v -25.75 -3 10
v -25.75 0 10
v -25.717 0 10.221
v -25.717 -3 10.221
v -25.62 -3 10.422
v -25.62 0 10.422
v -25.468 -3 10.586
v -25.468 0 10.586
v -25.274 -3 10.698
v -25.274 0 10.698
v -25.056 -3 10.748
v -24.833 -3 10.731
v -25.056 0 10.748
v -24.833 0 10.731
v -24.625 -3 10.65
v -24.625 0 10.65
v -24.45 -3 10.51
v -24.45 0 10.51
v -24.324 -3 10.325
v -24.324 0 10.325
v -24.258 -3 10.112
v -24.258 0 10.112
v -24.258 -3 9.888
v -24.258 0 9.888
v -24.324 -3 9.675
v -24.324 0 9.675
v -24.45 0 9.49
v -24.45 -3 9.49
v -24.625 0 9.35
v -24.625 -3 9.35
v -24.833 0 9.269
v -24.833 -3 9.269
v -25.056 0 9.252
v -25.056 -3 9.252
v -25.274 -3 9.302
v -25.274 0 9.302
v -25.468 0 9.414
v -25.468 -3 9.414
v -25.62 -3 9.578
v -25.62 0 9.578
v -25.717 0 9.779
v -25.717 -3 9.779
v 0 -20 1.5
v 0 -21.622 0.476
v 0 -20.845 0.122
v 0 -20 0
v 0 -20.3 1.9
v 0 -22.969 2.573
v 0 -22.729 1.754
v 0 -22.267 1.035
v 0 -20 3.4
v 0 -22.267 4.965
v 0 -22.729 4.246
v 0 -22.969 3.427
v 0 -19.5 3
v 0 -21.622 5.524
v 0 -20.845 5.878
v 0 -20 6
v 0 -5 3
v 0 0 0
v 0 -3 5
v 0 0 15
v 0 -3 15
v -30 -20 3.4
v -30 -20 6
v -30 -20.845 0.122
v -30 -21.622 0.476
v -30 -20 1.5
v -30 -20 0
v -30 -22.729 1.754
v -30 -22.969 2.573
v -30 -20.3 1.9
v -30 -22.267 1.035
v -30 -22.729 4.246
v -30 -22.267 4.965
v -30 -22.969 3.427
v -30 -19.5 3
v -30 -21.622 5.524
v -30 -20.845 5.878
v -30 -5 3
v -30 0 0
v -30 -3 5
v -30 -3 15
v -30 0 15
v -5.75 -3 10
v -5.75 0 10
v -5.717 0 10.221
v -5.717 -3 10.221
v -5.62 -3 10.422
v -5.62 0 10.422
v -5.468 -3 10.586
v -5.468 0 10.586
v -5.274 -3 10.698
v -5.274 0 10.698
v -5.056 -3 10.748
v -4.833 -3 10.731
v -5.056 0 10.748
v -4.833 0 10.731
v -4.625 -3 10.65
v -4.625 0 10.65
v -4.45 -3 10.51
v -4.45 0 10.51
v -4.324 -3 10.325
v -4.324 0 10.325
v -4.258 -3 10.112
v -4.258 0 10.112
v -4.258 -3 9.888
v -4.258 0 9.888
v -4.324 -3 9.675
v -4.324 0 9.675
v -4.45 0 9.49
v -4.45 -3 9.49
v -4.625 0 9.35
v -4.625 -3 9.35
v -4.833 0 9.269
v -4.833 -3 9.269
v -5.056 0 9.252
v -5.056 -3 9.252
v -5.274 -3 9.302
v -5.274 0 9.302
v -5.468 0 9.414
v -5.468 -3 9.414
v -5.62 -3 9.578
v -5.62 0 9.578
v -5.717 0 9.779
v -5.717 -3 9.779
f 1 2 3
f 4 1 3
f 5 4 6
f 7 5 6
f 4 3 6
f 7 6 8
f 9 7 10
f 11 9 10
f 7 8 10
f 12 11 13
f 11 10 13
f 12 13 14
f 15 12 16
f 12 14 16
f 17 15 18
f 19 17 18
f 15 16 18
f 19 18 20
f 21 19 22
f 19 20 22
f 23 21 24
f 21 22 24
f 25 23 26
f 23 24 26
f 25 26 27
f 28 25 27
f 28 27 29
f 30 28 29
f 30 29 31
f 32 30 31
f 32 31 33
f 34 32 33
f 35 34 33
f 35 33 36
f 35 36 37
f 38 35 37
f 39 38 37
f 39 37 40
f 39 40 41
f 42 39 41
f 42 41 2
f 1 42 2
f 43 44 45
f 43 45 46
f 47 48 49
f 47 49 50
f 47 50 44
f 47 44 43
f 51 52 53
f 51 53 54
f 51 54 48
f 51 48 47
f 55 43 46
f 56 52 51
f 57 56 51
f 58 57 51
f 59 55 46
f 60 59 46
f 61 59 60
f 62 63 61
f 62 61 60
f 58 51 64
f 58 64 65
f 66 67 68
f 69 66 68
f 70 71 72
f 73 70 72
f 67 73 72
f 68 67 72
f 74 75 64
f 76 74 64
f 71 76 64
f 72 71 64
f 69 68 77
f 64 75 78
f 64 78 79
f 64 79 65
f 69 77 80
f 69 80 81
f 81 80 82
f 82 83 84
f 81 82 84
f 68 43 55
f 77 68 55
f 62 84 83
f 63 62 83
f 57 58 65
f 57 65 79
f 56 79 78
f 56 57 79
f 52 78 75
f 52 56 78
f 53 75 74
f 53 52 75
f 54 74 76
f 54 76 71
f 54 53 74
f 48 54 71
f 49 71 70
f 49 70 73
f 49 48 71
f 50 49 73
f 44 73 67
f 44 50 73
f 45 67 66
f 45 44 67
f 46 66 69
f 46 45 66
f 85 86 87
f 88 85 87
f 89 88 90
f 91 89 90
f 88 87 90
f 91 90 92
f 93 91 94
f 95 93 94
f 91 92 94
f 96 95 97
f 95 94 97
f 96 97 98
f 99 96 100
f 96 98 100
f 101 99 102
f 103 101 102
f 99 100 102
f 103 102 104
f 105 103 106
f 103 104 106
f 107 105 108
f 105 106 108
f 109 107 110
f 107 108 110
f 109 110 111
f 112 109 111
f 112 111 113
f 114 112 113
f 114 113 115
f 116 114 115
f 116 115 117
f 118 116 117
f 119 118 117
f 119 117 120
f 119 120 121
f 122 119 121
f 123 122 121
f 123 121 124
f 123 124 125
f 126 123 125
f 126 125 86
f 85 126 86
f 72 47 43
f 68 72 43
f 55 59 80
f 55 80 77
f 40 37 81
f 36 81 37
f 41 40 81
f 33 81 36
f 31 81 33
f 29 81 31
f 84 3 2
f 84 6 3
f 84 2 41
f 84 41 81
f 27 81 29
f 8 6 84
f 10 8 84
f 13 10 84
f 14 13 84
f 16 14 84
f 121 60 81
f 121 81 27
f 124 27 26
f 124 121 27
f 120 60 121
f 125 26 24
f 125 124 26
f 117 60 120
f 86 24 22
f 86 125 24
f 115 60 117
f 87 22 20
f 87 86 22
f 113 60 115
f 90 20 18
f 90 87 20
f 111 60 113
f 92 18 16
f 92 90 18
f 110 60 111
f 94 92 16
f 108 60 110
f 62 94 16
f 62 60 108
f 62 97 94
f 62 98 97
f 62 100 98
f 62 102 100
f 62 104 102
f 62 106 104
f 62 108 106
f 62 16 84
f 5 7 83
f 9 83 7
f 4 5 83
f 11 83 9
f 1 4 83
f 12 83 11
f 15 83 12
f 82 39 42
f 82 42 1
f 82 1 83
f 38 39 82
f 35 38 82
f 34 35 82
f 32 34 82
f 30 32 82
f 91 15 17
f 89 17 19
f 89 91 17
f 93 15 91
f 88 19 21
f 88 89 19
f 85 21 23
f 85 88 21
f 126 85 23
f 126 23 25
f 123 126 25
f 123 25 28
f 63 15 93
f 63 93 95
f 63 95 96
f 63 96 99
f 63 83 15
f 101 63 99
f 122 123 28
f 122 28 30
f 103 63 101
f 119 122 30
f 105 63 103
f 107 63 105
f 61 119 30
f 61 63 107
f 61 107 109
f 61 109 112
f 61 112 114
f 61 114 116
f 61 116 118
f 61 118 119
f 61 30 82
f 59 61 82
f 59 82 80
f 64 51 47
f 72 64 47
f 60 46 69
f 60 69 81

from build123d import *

# Parameters (mm, degrees)
F1_DEPTH = 30
F3_D     = 1.5
F5_DEPTH = 30


with BuildPart() as f1:
    # F0 (on Right) → F1 (new body)
    with BuildSketch(Plane.YZ):
        Polygon((-20, 0), (0, 0), (0, 15), (-3, 15), (-3, 5), (-5, 3), (-20, 3), align=None)
        with BuildLine():
            ThreePointArc((-20, 6), (-23, 3), (-20, 0))
            Line((-20, 0), (-20, 3))
            Line((-20, 3), (-20, 6))
        make_face()
    extrude(amount=-F1_DEPTH)

    # F3 (through all)
    with Locations(Plane.XZ.offset(3)):
        with Locations((-25, 10), (-5, 10)):
            Hole(F3_D / 2)

    # F4 (on face) → F5 (cut)
    with BuildSketch(Plane.YZ):
        Polygon((-19.5, 3), (-20, 3), (-20, 1.5), align=None)
        Polygon((-20, 1.5), (-20, 3), (-20, 3.4), (-20.3, 1.9), align=None)
    extrude(amount=-F5_DEPTH, mode=Mode.SUBTRACT)


solid = f1.part
